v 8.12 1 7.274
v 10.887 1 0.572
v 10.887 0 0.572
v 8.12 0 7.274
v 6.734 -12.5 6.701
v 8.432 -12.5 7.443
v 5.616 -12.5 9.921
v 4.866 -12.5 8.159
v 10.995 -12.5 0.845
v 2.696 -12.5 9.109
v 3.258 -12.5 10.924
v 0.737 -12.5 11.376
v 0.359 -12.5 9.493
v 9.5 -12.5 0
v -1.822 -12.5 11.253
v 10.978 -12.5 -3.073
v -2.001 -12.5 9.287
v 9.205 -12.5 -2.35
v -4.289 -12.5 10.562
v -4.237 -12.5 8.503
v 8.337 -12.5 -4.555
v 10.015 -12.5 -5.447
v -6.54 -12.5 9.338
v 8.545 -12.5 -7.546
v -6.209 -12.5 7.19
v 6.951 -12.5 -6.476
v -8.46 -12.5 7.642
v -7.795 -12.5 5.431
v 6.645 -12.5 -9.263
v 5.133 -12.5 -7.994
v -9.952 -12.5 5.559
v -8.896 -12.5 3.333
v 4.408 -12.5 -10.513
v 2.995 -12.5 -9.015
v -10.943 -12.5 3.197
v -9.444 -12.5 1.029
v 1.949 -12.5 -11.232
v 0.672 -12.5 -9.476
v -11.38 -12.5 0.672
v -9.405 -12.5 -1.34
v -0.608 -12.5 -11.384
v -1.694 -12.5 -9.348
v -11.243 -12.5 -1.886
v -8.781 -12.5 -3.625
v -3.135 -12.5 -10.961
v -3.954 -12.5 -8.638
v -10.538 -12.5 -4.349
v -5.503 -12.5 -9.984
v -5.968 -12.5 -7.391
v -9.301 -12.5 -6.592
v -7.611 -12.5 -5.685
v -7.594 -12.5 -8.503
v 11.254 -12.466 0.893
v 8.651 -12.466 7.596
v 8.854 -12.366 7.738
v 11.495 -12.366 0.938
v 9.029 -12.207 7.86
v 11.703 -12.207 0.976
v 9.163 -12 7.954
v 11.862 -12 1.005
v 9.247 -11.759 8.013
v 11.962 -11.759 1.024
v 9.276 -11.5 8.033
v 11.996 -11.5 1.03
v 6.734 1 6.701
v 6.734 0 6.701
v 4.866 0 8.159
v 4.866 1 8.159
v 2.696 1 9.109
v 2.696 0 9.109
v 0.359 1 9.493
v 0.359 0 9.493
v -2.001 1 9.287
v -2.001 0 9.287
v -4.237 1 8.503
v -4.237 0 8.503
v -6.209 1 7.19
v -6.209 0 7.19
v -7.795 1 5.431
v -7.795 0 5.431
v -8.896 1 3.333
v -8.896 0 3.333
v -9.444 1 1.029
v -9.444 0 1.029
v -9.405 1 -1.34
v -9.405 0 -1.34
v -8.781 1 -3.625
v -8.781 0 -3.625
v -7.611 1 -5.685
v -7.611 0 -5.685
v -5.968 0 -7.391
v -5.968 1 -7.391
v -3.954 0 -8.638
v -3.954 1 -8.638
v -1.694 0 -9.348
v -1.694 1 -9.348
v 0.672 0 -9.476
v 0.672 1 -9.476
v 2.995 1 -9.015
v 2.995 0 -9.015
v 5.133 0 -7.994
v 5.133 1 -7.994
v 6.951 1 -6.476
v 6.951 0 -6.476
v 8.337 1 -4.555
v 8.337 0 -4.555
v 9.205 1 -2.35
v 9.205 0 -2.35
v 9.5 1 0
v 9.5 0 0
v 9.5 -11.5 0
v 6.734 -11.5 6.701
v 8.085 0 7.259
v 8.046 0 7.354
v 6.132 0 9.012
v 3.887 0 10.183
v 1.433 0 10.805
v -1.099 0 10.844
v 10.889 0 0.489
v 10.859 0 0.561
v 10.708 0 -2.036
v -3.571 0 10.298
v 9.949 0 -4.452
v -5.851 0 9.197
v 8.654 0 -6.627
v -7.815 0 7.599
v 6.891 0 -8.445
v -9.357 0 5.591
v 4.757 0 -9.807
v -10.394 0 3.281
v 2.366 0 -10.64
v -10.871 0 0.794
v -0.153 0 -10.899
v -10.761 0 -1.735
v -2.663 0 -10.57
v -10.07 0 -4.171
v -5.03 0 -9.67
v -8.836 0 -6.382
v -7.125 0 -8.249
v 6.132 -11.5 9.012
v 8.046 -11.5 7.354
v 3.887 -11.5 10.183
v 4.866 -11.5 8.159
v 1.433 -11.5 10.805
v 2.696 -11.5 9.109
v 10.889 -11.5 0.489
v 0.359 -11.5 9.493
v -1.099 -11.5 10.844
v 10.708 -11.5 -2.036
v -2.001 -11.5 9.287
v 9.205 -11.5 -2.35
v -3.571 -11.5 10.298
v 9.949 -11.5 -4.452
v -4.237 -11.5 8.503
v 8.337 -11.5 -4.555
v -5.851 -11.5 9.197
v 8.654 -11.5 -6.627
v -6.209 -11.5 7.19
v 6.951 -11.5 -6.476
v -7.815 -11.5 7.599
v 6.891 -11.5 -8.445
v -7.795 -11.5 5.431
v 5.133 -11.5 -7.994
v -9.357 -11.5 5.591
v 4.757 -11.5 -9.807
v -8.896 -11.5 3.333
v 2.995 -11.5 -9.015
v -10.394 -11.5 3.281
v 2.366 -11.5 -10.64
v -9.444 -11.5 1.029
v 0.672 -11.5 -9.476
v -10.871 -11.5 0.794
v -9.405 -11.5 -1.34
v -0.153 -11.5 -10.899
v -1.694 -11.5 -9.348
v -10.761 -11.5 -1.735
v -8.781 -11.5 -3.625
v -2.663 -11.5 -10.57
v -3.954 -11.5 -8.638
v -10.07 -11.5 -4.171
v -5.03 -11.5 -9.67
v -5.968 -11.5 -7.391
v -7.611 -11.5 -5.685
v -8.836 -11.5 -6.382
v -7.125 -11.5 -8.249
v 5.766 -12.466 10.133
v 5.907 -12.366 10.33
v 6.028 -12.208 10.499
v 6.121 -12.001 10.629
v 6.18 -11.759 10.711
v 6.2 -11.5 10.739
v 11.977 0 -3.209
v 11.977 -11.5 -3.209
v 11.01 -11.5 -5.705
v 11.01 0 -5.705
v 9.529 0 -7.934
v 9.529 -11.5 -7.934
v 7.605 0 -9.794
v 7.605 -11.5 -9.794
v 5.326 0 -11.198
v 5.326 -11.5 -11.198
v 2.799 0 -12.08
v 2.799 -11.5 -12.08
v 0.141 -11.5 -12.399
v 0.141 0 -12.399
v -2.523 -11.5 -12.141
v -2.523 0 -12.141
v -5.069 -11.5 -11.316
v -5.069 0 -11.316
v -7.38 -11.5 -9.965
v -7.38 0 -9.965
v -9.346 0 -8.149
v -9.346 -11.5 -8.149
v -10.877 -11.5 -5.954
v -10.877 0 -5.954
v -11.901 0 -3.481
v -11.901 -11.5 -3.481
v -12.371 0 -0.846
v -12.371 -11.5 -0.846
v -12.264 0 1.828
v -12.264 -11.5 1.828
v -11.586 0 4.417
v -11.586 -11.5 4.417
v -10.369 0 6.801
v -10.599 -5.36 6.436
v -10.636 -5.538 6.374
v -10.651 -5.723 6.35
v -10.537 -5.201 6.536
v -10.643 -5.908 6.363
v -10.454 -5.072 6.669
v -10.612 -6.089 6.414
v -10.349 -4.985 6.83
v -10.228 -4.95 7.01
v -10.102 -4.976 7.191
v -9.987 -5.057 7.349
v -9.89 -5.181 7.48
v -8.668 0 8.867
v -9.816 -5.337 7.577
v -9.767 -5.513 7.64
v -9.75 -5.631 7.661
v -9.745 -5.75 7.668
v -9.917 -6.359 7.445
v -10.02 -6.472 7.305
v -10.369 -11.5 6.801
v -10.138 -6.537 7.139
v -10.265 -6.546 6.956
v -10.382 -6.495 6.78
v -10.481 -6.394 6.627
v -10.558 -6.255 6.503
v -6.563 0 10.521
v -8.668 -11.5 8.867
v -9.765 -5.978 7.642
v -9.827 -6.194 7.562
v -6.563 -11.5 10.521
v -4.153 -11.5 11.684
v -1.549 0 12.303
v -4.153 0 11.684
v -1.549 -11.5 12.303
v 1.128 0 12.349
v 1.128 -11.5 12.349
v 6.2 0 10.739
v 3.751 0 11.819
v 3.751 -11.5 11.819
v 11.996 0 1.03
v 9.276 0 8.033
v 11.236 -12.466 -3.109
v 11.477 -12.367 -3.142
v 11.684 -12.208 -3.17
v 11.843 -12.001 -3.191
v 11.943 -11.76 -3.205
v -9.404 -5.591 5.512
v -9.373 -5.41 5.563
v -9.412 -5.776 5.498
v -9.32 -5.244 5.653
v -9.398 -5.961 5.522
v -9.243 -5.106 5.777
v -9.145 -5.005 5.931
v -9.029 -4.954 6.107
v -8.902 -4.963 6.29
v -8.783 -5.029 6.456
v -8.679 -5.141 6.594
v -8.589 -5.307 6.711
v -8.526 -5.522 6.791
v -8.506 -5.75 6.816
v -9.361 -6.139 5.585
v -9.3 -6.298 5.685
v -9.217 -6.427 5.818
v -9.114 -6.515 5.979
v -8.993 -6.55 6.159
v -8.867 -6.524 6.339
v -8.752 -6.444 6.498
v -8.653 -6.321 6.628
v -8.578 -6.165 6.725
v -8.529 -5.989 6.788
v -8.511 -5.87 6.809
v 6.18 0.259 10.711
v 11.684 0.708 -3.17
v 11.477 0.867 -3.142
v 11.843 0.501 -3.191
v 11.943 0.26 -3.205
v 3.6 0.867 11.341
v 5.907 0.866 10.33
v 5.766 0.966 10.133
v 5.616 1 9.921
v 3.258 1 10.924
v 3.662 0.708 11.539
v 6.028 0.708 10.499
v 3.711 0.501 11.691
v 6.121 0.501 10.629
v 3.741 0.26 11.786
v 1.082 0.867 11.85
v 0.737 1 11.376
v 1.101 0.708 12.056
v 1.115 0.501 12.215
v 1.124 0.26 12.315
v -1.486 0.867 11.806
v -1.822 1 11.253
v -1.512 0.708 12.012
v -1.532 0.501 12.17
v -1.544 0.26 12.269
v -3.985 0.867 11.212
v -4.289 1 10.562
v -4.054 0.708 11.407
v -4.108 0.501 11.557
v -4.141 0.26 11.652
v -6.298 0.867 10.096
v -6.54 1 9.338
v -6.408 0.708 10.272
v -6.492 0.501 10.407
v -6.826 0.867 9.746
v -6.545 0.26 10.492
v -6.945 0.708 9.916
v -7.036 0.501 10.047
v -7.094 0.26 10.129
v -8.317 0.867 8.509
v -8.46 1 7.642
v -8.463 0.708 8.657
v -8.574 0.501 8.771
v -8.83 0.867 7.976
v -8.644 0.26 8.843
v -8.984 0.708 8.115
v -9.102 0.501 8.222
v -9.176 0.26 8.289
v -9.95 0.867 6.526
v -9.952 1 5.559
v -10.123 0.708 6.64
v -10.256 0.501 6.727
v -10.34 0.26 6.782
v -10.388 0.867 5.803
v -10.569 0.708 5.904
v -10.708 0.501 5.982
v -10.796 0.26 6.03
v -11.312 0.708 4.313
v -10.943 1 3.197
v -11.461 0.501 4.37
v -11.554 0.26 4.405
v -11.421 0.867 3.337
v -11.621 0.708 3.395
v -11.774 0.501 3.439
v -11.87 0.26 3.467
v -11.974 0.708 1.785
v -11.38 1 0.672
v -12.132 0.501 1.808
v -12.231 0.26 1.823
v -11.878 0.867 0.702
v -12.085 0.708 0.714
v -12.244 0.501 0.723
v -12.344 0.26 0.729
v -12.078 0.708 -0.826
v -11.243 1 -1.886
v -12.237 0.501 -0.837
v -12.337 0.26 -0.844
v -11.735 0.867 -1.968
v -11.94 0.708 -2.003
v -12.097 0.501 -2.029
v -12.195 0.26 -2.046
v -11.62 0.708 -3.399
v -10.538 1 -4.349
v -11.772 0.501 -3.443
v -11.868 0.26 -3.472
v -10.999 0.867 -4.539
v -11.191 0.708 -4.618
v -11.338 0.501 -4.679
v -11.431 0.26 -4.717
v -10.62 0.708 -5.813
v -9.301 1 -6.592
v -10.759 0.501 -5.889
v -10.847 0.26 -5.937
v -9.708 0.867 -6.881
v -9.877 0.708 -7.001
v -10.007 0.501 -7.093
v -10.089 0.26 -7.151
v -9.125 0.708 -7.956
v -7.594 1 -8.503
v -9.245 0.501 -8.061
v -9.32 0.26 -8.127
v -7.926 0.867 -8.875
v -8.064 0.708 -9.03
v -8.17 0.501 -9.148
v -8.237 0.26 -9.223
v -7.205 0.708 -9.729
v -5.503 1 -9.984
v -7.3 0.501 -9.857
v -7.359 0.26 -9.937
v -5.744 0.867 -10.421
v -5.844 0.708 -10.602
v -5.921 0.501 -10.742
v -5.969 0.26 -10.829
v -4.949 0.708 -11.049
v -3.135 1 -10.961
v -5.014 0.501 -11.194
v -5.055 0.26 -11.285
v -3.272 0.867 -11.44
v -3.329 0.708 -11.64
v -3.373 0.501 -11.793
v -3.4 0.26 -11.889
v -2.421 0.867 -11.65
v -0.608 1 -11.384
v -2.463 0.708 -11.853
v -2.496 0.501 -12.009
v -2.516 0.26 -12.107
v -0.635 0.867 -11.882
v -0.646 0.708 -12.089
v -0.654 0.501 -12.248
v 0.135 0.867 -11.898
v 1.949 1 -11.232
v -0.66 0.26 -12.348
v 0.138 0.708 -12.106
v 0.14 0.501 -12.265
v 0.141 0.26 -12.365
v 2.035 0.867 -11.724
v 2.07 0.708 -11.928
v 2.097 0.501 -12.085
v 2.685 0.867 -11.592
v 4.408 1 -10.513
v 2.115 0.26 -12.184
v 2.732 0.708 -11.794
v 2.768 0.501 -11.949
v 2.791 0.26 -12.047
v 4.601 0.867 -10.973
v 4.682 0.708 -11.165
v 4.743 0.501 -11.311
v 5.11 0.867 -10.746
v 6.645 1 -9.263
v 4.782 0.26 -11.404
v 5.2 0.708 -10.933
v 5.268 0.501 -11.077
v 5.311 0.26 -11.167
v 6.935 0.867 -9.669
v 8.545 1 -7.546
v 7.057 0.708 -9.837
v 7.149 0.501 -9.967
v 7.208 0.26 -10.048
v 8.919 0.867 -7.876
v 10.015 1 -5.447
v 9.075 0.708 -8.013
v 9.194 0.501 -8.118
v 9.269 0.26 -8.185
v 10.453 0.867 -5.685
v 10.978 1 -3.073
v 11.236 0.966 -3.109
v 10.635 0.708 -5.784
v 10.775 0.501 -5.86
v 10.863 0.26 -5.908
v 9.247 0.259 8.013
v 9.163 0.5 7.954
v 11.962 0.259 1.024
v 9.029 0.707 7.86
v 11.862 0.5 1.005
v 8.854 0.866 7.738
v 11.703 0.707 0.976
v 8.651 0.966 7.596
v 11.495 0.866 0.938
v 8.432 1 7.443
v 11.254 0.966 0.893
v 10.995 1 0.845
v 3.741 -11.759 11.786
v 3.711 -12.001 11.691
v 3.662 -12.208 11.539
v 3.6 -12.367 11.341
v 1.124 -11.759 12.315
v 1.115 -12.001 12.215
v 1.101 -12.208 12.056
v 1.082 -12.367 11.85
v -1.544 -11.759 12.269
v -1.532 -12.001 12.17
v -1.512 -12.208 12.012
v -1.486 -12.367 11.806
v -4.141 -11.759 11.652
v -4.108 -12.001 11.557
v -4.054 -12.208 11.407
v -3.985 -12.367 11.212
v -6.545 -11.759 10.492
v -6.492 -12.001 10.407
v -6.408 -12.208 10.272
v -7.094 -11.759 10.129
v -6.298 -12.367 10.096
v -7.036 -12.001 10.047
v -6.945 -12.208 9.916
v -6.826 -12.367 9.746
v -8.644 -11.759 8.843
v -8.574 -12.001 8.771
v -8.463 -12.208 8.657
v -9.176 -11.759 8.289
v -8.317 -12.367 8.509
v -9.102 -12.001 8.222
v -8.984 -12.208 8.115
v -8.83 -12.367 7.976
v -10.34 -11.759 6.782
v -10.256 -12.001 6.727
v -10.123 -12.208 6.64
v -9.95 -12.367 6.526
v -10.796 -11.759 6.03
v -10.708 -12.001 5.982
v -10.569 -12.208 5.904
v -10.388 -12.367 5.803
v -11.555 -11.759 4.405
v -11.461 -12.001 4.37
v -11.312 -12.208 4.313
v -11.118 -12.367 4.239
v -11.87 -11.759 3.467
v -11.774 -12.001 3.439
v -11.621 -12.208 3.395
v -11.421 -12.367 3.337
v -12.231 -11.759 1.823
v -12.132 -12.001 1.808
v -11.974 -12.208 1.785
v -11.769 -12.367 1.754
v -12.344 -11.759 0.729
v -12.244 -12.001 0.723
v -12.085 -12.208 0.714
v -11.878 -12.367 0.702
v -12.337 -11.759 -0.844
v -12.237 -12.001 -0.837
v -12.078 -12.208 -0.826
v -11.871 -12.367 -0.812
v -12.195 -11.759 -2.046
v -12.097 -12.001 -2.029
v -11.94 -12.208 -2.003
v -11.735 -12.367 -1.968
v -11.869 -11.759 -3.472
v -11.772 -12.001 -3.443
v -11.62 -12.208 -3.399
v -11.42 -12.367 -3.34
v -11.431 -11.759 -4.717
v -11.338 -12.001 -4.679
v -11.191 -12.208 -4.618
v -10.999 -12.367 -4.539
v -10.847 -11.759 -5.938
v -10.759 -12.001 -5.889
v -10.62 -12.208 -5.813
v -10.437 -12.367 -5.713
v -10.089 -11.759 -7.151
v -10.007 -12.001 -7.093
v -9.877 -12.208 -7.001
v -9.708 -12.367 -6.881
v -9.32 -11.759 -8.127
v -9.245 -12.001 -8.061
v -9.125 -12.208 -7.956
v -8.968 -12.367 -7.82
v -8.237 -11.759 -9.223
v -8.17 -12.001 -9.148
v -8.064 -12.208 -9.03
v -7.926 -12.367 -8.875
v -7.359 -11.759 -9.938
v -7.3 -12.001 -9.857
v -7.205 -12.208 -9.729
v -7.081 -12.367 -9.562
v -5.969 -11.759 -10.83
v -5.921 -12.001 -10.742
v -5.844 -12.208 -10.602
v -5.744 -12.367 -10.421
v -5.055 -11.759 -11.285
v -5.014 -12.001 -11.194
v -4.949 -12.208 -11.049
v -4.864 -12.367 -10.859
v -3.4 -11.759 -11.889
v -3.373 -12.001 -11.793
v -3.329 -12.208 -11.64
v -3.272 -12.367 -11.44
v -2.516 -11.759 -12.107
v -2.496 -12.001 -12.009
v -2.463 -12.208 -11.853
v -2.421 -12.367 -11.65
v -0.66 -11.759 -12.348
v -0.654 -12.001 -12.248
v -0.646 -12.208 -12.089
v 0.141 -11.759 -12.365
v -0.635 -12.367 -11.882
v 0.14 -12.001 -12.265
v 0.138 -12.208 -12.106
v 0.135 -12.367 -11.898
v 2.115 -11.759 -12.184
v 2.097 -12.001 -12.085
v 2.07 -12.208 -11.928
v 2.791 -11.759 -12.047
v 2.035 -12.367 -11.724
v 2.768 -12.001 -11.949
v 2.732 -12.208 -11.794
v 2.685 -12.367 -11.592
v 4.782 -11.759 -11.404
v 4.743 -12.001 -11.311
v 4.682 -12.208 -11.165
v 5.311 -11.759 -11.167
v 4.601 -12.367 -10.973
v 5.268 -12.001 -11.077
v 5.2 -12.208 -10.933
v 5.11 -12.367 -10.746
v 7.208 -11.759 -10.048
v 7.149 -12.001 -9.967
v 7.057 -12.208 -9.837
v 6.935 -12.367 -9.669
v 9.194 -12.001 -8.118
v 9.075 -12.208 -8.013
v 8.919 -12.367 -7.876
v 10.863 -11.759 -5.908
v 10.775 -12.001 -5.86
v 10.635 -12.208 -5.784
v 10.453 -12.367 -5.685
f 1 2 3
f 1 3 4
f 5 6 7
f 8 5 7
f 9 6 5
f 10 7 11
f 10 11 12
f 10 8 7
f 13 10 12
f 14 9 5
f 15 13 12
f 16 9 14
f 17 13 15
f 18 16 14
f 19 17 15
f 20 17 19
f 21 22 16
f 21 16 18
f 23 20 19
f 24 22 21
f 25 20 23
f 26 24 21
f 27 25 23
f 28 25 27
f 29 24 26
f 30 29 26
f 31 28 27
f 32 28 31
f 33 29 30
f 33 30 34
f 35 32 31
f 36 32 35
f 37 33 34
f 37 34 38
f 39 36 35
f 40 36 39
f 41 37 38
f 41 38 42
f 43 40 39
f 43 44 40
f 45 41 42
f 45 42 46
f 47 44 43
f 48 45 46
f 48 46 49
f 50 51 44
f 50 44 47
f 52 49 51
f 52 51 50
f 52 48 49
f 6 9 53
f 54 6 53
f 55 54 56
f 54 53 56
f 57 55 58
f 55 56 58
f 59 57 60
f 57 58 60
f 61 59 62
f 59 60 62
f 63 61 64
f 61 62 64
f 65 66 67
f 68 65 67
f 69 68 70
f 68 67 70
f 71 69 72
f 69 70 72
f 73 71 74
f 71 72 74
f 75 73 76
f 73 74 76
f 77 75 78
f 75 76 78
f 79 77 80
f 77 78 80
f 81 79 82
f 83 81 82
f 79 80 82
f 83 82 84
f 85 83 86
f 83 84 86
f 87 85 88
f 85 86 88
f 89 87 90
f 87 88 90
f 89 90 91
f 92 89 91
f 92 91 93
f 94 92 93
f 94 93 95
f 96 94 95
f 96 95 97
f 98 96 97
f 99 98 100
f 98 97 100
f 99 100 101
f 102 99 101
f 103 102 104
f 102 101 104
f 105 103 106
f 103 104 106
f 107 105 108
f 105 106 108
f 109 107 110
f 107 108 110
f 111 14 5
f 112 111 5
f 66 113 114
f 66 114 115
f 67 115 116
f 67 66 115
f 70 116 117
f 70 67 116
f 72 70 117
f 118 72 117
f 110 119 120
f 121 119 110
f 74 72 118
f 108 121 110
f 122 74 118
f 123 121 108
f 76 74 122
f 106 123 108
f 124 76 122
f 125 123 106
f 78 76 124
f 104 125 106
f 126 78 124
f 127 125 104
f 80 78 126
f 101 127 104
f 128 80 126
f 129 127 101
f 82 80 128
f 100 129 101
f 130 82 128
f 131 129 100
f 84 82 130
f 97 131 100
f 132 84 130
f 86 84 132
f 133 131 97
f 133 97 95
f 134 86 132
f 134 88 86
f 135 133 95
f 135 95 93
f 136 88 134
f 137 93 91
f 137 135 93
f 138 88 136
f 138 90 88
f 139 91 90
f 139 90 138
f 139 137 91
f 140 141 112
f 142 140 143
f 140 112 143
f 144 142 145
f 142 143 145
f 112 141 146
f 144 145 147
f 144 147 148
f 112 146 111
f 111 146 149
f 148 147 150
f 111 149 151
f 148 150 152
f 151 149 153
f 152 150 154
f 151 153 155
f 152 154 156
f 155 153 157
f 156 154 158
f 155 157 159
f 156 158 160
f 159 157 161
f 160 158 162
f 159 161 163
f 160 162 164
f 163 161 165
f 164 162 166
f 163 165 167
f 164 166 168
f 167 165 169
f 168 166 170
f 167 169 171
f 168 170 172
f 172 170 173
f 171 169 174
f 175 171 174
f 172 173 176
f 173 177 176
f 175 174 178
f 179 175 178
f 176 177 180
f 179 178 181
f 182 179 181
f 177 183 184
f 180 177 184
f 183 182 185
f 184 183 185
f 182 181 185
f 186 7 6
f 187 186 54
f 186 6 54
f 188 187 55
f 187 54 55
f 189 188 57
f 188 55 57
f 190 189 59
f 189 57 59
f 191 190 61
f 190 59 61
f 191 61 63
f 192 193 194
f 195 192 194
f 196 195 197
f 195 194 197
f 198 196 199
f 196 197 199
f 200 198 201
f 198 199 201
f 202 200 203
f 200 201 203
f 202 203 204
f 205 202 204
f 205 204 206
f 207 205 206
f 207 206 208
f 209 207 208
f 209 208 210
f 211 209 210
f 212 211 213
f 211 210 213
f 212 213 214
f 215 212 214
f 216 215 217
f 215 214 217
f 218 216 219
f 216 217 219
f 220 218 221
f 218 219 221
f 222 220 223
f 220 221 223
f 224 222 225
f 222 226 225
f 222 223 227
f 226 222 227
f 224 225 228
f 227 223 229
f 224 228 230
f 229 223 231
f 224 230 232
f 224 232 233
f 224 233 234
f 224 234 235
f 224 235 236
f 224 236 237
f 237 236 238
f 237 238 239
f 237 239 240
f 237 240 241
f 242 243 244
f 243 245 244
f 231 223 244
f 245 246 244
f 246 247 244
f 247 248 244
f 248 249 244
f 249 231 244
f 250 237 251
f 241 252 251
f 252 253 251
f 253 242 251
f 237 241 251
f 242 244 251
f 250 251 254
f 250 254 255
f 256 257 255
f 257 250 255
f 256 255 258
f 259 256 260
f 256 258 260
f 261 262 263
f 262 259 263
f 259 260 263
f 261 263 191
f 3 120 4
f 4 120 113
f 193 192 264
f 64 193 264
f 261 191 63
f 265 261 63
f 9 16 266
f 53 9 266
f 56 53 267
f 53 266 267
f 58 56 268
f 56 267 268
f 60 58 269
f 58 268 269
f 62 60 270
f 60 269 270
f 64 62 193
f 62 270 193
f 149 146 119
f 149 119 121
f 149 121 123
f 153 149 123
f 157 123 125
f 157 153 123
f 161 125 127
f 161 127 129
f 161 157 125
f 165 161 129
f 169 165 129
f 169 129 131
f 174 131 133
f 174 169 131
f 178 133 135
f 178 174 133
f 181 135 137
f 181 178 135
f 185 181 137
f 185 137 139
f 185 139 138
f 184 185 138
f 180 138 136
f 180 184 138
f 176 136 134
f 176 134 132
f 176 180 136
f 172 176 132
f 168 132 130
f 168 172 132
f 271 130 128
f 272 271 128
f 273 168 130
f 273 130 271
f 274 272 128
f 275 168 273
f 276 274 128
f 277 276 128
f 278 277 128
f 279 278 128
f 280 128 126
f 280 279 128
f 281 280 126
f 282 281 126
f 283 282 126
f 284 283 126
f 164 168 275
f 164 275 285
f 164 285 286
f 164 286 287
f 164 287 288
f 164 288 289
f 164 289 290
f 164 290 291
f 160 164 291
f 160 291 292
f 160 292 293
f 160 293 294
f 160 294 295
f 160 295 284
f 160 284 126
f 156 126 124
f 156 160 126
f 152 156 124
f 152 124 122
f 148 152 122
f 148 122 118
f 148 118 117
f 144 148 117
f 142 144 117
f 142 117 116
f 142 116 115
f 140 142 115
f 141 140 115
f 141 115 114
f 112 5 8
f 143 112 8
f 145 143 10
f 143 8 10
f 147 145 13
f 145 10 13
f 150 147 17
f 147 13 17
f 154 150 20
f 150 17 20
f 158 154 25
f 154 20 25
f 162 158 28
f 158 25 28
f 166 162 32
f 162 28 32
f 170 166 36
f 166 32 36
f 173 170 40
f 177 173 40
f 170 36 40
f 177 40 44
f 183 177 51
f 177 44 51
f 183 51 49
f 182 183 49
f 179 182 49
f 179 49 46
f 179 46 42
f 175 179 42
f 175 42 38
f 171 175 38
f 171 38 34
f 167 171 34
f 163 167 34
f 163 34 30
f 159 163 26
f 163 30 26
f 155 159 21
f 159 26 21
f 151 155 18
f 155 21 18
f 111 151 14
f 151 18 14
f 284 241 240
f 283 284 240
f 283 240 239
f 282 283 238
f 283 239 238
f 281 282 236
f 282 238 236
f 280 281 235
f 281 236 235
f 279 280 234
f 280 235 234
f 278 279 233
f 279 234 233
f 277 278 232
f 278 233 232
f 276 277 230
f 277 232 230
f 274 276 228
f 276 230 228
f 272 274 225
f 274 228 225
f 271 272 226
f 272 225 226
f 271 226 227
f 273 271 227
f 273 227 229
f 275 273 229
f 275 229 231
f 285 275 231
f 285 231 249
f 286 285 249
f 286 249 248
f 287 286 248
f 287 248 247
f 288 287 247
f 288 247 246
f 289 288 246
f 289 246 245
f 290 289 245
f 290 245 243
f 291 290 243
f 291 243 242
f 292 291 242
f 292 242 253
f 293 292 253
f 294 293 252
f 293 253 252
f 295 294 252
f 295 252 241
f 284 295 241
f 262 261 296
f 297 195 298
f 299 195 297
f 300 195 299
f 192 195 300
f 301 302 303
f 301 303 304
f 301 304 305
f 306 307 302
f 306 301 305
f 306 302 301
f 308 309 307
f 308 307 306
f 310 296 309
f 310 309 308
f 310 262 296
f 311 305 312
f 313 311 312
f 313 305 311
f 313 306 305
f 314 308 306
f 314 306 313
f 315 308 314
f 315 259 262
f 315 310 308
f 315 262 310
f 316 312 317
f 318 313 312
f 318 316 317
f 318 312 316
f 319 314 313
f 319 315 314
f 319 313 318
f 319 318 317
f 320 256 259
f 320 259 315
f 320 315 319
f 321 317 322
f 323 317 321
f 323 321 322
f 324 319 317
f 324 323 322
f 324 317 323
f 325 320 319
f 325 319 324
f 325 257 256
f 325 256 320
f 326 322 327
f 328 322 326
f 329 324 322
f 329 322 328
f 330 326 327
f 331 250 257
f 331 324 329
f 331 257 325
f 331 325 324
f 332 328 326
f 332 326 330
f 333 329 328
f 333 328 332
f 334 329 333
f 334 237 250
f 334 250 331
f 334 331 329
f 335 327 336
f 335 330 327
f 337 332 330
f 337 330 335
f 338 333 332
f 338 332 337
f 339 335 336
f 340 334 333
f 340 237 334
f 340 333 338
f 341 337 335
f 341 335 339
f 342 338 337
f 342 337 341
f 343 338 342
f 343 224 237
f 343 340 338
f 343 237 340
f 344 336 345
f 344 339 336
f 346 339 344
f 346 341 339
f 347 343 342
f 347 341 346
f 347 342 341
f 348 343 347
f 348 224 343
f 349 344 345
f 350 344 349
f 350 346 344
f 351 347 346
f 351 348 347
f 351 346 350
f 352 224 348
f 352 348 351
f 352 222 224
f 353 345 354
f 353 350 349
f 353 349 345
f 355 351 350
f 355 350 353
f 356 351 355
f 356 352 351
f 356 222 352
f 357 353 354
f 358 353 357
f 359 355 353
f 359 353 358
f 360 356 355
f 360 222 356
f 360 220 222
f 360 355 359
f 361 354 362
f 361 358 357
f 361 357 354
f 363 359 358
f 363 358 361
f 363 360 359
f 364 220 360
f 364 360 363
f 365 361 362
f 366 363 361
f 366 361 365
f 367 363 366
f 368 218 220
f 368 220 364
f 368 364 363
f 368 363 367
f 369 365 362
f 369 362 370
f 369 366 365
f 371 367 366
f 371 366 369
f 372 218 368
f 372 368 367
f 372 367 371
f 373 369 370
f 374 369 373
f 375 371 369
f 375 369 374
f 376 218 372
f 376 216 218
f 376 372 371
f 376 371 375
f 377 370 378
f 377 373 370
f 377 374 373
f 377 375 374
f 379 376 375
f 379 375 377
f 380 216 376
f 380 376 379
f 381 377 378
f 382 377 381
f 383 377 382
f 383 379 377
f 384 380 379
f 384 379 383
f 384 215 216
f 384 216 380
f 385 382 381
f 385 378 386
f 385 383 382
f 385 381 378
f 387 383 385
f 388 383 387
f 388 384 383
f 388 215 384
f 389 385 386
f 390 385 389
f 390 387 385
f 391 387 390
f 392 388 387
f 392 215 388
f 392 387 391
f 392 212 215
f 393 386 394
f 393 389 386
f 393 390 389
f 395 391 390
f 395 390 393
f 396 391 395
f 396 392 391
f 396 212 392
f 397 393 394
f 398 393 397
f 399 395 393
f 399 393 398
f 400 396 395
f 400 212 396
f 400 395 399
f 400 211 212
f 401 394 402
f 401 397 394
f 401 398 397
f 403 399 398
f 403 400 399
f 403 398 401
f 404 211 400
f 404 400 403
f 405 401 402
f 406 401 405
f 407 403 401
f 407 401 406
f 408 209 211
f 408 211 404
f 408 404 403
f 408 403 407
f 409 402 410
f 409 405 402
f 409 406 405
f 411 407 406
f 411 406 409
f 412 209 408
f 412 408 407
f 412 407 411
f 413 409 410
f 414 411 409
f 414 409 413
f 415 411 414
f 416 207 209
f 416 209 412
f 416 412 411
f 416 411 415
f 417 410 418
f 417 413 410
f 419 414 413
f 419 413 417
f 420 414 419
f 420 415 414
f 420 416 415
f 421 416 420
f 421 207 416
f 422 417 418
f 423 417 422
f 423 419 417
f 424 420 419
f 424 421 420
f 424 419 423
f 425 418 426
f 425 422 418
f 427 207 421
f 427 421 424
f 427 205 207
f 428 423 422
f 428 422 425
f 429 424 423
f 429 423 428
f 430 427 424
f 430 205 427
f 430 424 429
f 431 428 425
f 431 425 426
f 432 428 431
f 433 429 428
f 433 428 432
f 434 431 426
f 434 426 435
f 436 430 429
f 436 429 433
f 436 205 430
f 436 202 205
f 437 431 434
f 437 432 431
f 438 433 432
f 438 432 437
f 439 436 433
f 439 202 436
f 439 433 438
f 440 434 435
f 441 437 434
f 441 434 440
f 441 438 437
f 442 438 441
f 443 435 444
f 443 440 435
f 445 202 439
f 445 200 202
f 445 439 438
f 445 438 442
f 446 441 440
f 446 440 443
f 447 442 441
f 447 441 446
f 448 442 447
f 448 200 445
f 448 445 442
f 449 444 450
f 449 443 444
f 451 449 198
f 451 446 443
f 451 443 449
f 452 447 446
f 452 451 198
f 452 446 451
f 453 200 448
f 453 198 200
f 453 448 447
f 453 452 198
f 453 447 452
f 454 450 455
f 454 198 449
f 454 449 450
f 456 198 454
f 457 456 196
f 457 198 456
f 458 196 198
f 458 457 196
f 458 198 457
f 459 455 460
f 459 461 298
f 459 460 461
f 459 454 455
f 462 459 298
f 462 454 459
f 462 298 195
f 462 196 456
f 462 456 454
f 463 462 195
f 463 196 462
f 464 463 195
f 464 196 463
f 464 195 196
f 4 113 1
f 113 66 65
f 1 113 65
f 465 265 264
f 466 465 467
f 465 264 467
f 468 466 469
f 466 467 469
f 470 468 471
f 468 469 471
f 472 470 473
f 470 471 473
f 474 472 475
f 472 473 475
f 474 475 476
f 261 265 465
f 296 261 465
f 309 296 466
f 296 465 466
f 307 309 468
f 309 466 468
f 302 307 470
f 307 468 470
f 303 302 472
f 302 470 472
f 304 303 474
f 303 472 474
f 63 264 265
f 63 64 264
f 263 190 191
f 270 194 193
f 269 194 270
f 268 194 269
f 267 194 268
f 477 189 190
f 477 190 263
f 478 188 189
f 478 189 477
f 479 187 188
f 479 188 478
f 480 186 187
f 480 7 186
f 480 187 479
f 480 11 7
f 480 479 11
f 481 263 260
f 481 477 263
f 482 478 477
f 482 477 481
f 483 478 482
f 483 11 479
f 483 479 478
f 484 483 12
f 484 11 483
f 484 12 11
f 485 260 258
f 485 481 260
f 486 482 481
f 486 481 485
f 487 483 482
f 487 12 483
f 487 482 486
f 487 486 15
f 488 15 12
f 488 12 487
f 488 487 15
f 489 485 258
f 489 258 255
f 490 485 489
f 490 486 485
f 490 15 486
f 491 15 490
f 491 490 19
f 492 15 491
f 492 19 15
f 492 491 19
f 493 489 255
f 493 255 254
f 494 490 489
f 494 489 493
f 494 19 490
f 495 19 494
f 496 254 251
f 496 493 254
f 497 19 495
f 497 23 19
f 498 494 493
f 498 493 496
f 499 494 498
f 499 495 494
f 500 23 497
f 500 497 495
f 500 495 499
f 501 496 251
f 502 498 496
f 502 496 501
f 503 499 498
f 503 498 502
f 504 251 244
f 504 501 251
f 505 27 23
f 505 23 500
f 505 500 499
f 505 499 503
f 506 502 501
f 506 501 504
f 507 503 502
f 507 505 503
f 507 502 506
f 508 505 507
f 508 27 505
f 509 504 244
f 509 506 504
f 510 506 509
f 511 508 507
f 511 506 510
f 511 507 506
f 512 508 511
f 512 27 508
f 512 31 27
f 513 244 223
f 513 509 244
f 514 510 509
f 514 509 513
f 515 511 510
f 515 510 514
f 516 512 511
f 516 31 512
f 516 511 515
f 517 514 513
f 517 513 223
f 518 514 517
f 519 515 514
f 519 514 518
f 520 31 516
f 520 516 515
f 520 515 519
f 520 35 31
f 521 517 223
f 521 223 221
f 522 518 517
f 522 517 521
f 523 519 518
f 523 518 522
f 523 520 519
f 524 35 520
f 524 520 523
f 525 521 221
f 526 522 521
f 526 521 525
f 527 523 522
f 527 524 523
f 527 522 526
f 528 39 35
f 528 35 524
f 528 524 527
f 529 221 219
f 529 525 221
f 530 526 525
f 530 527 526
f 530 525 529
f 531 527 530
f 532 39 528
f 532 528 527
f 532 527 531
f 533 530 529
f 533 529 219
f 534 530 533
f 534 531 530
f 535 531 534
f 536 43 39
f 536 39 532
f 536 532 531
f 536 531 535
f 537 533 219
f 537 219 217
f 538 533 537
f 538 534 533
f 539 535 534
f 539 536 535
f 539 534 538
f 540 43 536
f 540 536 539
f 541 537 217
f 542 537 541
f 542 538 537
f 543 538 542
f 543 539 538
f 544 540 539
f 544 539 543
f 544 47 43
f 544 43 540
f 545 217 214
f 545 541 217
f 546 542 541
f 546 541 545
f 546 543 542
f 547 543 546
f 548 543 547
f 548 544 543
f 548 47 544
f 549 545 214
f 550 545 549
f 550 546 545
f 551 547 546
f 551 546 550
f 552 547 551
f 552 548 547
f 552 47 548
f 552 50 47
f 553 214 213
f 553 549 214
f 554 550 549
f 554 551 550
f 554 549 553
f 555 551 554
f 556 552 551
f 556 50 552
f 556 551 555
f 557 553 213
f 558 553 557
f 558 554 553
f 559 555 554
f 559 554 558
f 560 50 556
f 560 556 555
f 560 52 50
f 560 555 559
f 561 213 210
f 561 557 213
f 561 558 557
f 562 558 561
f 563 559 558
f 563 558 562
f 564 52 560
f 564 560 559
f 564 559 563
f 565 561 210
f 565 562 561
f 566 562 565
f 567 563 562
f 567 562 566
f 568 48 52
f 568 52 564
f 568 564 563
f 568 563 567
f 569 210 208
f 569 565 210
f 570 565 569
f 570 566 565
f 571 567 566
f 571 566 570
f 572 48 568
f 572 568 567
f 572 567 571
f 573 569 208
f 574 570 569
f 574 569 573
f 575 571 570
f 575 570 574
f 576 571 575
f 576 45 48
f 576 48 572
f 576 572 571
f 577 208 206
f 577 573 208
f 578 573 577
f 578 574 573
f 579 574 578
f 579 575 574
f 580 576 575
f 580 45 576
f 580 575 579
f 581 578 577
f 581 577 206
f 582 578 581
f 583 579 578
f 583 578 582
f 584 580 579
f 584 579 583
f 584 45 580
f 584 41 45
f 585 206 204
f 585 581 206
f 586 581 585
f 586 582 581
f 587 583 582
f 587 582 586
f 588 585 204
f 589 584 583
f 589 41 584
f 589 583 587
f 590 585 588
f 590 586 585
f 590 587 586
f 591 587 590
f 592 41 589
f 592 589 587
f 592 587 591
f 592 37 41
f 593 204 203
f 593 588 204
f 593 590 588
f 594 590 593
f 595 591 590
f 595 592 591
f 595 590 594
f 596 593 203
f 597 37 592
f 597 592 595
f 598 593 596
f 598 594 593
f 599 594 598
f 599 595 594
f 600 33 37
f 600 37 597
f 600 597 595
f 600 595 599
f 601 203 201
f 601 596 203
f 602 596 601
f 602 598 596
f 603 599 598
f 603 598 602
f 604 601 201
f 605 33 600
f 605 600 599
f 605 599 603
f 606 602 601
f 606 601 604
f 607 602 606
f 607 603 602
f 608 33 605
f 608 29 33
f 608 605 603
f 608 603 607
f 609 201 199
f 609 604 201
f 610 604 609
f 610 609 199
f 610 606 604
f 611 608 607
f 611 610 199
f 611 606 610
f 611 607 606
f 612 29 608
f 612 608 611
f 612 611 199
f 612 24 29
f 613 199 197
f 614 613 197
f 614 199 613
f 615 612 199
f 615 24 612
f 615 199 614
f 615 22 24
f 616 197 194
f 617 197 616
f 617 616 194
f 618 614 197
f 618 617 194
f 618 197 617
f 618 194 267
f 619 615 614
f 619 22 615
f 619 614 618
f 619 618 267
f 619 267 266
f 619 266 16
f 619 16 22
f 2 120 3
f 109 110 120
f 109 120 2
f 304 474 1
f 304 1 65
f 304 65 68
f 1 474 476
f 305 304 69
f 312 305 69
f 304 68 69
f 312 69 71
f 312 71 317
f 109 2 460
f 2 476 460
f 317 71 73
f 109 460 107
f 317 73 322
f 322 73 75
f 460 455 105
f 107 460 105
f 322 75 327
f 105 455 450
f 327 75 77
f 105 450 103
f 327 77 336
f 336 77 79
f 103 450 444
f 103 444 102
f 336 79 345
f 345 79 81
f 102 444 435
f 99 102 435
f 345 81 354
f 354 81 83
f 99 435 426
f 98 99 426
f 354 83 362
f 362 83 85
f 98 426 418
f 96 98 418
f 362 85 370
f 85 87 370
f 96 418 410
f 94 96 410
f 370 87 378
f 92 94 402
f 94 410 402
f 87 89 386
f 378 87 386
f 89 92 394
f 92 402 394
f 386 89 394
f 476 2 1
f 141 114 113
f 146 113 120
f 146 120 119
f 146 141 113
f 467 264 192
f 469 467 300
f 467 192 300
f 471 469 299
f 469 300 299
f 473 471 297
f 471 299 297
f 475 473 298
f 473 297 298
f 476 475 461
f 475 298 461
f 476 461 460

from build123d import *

# Parameters (mm, degrees)
EXTRUDE_1_DEPTH     = 1
EXTRUDE_START       = 11.5
EXTRUDE_3_DEPTH     = 11.5
EXTRUDE_START_2     = 1
EXTRUDE_4_DEPTH     = 1
FILLET_1_R          = 1
FILLET_2_R          = 1
SKETCH_7_W          = 7.249999999999998
SKETCH_7_H          = 1
CUT_EXTRUDE_1_DEPTH = 1.5
SKETCH1_R           = 0.8
CUT_EXTRUDE1_DEPTH  = 10


with BuildPart() as part:
    # 草图1 → 凸台-拉伸1 (new body)
    with BuildSketch(Plane(origin=(0, 0, 0), x_dir=(1, 0, 0), z_dir=(0, 1, 0))):
        with BuildLine():
            Line((11.995707880639234, -1.030263157894738), (9.275971038533973, -8.032758066524272))
            Line((9.275971038533973, -8.032758066524272), (6.200000000000001, -10.73871500692704))
            ThreePointArc((6.200000000000001, -10.73871500692704), (-11.456106203139957, 4.7452745613271095), (11.977480245984443, 3.2093561592712687))
            Line((11.977480245984443, 3.2093561592712687), (11.995707880639234, -1.030263157894738))
        make_face()
        with BuildLine():
            Line((9.5, 0), (6.733552631578949, -6.701437827642379))
            ThreePointArc((6.733552631578949, -6.701437827642379), (-8.78119439484174, 3.625), (9.5, 0))
        make_face(mode=Mode.SUBTRACT)
    extrude(amount=EXTRUDE_1_DEPTH)

    # 草图2 → 凸台-拉伸3 (add)
    with BuildSketch(Plane(origin=(0, 0, 0), x_dir=(-1, 0, 0), z_dir=(0, -1, 0)).offset(EXTRUDE_START)):
        with BuildLine():
            Line((-11.995707880639236, -1.0302631578947385), (-11.97748024598447, 3.2093561592711763))
            ThreePointArc((-11.97748024598447, 3.2093561592711763), (11.456106203139939, 4.745274561327148), (-6.2, -10.738715006927038))
            Line((-6.2, -10.738715006927038), (-9.275971038533974, -8.032758066524272))
            Line((-9.275971038533974, -8.032758066524272), (-11.995707880639236, -1.0302631578947385))
        make_face()
        with BuildLine():
            Line((-8.045661066301793, -7.353729530394456), (-10.889013517064273, -0.4892694811569148))
            ThreePointArc((-10.889013517064273, -0.4892694811569148), (10.070286904373022, 4.171249412779482), (-8.045661066301793, -7.353729530394456))
        make_face(mode=Mode.SUBTRACT)
    extrude(amount=-EXTRUDE_3_DEPTH)

    # 草图5 → 凸台-拉伸4 (add)
    with BuildSketch(Plane(origin=(0, -11.5, 0), x_dir=(-1, 0, 0), z_dir=(0, -1, 0)).offset(EXTRUDE_START_2)):
        with BuildLine():
            Line((-11.977480245984468, 3.2093561592711772), (-11.995707880639236, -1.0302631578947385))
            Line((-11.995707880639236, -1.0302631578947385), (-9.275971038533974, -8.032758066524272))
            Line((-9.275971038533974, -8.032758066524272), (-6.200000000000009, -10.738715006927029))
            ThreePointArc((-6.200000000000009, -10.738715006927029), (11.456106203139935, 4.745274561327147), (-11.977480245984468, 3.2093561592711772))
        make_face()
        with BuildLine():
            Line((-9.5, 0), (-6.733552631578949, -6.701437827642379))
            ThreePointArc((-6.733552631578949, -6.701437827642379), (8.78119439484174, 3.624999999999999), (-9.5, 0))
        make_face(mode=Mode.SUBTRACT)
    extrude(amount=-EXTRUDE_4_DEPTH)

    # 圆角1
    # the kernel refuses this fillet: 1 mm, written as the material it takes off along each edge
    with BuildSketch(Plane(origin=(11.1530264468926, -12.5, 6.38149703508447), x_dir=(-0.6605044125759205, 0, -0.75082216334345), z_dir=(-0.75082216334345, 0, 0.6605044125759205))) as fillet_1_piece_1:
        with BuildLine():
            CenterArc((FILLET_1_R, -FILLET_1_R), FILLET_1_R, 90, 90)
            Line((0, -FILLET_1_R), (0, 0))
            Line((0, 0), (FILLET_1_R, 0))
        make_face()
    extrude(amount=9.096803728910329, mode=Mode.SUBTRACT)
    with BuildSketch(Plane(origin=(3.36e-15, -12.5, -3.77e-15), x_dir=(0.663902971885599, 0, 0.7478187239709029), z_dir=(0.7478187239709029, 0, -0.663902971885599))) as fillet_1_piece_2:
        with BuildLine():
            CenterArc((12.399999999999997 - FILLET_1_R, -FILLET_1_R), FILLET_1_R, 0, 90)
            Line((12.399999999999997 - FILLET_1_R, 0), (12.399999999999997, 0))
            Line((12.399999999999997, 0), (12.399999999999999, -FILLET_1_R))
        make_face()
    revolve(axis=Axis((3.36e-15, -12.5, -3.77e-15), (0, -1, 0)), revolution_arc=308.1964386657649, mode=Mode.SUBTRACT)
    with BuildSketch(Plane(origin=(11.966731954198387, -12.5, -5.709333054009145), x_dir=(0, 1, 0), z_dir=(0.0042993167144171895, 0, 0.9999907578951863))) as fillet_1_piece_3:
        with BuildLine():
            CenterArc((FILLET_1_R, FILLET_1_R), FILLET_1_R, 180, 90)
            Line((0, FILLET_1_R), (0, 0))
            Line((0, 0), (FILLET_1_R, 0))
        make_face()
    extrude(amount=9.239658500534155, mode=Mode.SUBTRACT)
    with BuildSketch(Plane(origin=(12.900824508619046, -12.5, -1.3001367841226104), x_dir=(7e-17, 1, 3e-17), z_dir=(-0.36204665119192375, 0, 0.9321599768069393))) as fillet_1_piece_4:
        with BuildLine():
            CenterArc((FILLET_1_R, FILLET_1_R), FILLET_1_R, 180, 90)
            Line((-8e-17, FILLET_1_R), (0, 0))
            Line((0, 0), (FILLET_1_R, 0))
        make_face()
    extrude(amount=12.512117107426324, mode=Mode.SUBTRACT)

    # 圆角2
    # the kernel refuses this fillet: 1 mm, written as the material it takes off along each edge
    with BuildSketch(Plane(origin=(11.966731954198387, 1, -5.709333054009236), x_dir=(0, -1, 0), z_dir=(0.004299316714422545, 0, 0.9999907578951863))) as fillet_2_piece_1:
        with BuildLine():
            CenterArc((FILLET_2_R, -FILLET_2_R), FILLET_2_R, 90, 90)
            Line((0, -FILLET_2_R), (0, 0))
            Line((0, 0), (FILLET_2_R, 0))
        make_face()
    extrude(amount=9.239658500534247, mode=Mode.SUBTRACT)
    with BuildSketch(Plane(origin=(6e-17, 1, 1.33e-15), x_dir=(0.6639029718855987, 0, 0.7478187239709033), z_dir=(0.7478187239709033, 0, -0.6639029718855987))) as fillet_2_piece_2:
        with BuildLine():
            CenterArc((12.4 - FILLET_2_R, FILLET_2_R), FILLET_2_R, 270, 90)
            Line((12.4 - FILLET_2_R, 0), (12.4, 0))
            Line((12.4, 0), (12.400000000000002, FILLET_2_R))
        make_face()
    revolve(axis=Axis((6e-17, 1, 1.33e-15), (0, -1, 0)), revolution_arc=308.19643866576433, mode=Mode.SUBTRACT)
    with BuildSketch(Plane(origin=(11.153026446892596, 1, 6.381497035084468), x_dir=(-0.6605044125759212, 0, -0.7508221633434493), z_dir=(-0.7508221633434494, 0, 0.6605044125759213))) as fillet_2_piece_3:
        with BuildLine():
            CenterArc((FILLET_2_R, FILLET_2_R), FILLET_2_R, 180, 90)
            Line((0, FILLET_2_R), (0, 0))
            Line((0, 0), (FILLET_2_R, 0))
        make_face()
    extrude(amount=9.096803728910343, mode=Mode.SUBTRACT)
    with BuildSketch(Plane(origin=(12.900824508619046, 1, -1.3001367841226104), x_dir=(-0.9321599768069392, 0, -0.3620466511919237), z_dir=(-0.36204665119192375, 0, 0.9321599768069393))) as fillet_2_piece_4:
        with BuildLine():
            CenterArc((FILLET_2_R, FILLET_2_R), FILLET_2_R, 180, 90)
            Line((8e-17, FILLET_2_R), (0, 0))
            Line((0, 0), (FILLET_2_R, 0))
        make_face()
    extrude(amount=12.512117107426329, mode=Mode.SUBTRACT)

    # 草图7 → 切除-拉伸1 (cut)
    with BuildSketch(Plane(origin=(8.116776315789474, 0, 3.3507189138211895), x_dir=(-0.3815789473684208, 0, 0.9243362520886044), z_dir=(-0.9243362520886044, 0, -0.3815789473684208))):
        with Locations((0, 0.5)):
            Rectangle(SKETCH_7_W, SKETCH_7_H)
    extrude(amount=-CUT_EXTRUDE_1_DEPTH, mode=Mode.SUBTRACT)

    # Sketch1 → Cut-Extrude1 (cut)
    with BuildSketch(Plane(origin=(-10.219164738912983, -5.75, 7.023437337867946), x_dir=(0.5664062369248344, 0, 0.8241261886220147), z_dir=(-0.8241261886220146, 0, 0.5664062369248343))):
        Circle(SKETCH1_R)
    extrude(amount=-CUT_EXTRUDE1_DEPTH, mode=Mode.SUBTRACT)


solid = part.part
